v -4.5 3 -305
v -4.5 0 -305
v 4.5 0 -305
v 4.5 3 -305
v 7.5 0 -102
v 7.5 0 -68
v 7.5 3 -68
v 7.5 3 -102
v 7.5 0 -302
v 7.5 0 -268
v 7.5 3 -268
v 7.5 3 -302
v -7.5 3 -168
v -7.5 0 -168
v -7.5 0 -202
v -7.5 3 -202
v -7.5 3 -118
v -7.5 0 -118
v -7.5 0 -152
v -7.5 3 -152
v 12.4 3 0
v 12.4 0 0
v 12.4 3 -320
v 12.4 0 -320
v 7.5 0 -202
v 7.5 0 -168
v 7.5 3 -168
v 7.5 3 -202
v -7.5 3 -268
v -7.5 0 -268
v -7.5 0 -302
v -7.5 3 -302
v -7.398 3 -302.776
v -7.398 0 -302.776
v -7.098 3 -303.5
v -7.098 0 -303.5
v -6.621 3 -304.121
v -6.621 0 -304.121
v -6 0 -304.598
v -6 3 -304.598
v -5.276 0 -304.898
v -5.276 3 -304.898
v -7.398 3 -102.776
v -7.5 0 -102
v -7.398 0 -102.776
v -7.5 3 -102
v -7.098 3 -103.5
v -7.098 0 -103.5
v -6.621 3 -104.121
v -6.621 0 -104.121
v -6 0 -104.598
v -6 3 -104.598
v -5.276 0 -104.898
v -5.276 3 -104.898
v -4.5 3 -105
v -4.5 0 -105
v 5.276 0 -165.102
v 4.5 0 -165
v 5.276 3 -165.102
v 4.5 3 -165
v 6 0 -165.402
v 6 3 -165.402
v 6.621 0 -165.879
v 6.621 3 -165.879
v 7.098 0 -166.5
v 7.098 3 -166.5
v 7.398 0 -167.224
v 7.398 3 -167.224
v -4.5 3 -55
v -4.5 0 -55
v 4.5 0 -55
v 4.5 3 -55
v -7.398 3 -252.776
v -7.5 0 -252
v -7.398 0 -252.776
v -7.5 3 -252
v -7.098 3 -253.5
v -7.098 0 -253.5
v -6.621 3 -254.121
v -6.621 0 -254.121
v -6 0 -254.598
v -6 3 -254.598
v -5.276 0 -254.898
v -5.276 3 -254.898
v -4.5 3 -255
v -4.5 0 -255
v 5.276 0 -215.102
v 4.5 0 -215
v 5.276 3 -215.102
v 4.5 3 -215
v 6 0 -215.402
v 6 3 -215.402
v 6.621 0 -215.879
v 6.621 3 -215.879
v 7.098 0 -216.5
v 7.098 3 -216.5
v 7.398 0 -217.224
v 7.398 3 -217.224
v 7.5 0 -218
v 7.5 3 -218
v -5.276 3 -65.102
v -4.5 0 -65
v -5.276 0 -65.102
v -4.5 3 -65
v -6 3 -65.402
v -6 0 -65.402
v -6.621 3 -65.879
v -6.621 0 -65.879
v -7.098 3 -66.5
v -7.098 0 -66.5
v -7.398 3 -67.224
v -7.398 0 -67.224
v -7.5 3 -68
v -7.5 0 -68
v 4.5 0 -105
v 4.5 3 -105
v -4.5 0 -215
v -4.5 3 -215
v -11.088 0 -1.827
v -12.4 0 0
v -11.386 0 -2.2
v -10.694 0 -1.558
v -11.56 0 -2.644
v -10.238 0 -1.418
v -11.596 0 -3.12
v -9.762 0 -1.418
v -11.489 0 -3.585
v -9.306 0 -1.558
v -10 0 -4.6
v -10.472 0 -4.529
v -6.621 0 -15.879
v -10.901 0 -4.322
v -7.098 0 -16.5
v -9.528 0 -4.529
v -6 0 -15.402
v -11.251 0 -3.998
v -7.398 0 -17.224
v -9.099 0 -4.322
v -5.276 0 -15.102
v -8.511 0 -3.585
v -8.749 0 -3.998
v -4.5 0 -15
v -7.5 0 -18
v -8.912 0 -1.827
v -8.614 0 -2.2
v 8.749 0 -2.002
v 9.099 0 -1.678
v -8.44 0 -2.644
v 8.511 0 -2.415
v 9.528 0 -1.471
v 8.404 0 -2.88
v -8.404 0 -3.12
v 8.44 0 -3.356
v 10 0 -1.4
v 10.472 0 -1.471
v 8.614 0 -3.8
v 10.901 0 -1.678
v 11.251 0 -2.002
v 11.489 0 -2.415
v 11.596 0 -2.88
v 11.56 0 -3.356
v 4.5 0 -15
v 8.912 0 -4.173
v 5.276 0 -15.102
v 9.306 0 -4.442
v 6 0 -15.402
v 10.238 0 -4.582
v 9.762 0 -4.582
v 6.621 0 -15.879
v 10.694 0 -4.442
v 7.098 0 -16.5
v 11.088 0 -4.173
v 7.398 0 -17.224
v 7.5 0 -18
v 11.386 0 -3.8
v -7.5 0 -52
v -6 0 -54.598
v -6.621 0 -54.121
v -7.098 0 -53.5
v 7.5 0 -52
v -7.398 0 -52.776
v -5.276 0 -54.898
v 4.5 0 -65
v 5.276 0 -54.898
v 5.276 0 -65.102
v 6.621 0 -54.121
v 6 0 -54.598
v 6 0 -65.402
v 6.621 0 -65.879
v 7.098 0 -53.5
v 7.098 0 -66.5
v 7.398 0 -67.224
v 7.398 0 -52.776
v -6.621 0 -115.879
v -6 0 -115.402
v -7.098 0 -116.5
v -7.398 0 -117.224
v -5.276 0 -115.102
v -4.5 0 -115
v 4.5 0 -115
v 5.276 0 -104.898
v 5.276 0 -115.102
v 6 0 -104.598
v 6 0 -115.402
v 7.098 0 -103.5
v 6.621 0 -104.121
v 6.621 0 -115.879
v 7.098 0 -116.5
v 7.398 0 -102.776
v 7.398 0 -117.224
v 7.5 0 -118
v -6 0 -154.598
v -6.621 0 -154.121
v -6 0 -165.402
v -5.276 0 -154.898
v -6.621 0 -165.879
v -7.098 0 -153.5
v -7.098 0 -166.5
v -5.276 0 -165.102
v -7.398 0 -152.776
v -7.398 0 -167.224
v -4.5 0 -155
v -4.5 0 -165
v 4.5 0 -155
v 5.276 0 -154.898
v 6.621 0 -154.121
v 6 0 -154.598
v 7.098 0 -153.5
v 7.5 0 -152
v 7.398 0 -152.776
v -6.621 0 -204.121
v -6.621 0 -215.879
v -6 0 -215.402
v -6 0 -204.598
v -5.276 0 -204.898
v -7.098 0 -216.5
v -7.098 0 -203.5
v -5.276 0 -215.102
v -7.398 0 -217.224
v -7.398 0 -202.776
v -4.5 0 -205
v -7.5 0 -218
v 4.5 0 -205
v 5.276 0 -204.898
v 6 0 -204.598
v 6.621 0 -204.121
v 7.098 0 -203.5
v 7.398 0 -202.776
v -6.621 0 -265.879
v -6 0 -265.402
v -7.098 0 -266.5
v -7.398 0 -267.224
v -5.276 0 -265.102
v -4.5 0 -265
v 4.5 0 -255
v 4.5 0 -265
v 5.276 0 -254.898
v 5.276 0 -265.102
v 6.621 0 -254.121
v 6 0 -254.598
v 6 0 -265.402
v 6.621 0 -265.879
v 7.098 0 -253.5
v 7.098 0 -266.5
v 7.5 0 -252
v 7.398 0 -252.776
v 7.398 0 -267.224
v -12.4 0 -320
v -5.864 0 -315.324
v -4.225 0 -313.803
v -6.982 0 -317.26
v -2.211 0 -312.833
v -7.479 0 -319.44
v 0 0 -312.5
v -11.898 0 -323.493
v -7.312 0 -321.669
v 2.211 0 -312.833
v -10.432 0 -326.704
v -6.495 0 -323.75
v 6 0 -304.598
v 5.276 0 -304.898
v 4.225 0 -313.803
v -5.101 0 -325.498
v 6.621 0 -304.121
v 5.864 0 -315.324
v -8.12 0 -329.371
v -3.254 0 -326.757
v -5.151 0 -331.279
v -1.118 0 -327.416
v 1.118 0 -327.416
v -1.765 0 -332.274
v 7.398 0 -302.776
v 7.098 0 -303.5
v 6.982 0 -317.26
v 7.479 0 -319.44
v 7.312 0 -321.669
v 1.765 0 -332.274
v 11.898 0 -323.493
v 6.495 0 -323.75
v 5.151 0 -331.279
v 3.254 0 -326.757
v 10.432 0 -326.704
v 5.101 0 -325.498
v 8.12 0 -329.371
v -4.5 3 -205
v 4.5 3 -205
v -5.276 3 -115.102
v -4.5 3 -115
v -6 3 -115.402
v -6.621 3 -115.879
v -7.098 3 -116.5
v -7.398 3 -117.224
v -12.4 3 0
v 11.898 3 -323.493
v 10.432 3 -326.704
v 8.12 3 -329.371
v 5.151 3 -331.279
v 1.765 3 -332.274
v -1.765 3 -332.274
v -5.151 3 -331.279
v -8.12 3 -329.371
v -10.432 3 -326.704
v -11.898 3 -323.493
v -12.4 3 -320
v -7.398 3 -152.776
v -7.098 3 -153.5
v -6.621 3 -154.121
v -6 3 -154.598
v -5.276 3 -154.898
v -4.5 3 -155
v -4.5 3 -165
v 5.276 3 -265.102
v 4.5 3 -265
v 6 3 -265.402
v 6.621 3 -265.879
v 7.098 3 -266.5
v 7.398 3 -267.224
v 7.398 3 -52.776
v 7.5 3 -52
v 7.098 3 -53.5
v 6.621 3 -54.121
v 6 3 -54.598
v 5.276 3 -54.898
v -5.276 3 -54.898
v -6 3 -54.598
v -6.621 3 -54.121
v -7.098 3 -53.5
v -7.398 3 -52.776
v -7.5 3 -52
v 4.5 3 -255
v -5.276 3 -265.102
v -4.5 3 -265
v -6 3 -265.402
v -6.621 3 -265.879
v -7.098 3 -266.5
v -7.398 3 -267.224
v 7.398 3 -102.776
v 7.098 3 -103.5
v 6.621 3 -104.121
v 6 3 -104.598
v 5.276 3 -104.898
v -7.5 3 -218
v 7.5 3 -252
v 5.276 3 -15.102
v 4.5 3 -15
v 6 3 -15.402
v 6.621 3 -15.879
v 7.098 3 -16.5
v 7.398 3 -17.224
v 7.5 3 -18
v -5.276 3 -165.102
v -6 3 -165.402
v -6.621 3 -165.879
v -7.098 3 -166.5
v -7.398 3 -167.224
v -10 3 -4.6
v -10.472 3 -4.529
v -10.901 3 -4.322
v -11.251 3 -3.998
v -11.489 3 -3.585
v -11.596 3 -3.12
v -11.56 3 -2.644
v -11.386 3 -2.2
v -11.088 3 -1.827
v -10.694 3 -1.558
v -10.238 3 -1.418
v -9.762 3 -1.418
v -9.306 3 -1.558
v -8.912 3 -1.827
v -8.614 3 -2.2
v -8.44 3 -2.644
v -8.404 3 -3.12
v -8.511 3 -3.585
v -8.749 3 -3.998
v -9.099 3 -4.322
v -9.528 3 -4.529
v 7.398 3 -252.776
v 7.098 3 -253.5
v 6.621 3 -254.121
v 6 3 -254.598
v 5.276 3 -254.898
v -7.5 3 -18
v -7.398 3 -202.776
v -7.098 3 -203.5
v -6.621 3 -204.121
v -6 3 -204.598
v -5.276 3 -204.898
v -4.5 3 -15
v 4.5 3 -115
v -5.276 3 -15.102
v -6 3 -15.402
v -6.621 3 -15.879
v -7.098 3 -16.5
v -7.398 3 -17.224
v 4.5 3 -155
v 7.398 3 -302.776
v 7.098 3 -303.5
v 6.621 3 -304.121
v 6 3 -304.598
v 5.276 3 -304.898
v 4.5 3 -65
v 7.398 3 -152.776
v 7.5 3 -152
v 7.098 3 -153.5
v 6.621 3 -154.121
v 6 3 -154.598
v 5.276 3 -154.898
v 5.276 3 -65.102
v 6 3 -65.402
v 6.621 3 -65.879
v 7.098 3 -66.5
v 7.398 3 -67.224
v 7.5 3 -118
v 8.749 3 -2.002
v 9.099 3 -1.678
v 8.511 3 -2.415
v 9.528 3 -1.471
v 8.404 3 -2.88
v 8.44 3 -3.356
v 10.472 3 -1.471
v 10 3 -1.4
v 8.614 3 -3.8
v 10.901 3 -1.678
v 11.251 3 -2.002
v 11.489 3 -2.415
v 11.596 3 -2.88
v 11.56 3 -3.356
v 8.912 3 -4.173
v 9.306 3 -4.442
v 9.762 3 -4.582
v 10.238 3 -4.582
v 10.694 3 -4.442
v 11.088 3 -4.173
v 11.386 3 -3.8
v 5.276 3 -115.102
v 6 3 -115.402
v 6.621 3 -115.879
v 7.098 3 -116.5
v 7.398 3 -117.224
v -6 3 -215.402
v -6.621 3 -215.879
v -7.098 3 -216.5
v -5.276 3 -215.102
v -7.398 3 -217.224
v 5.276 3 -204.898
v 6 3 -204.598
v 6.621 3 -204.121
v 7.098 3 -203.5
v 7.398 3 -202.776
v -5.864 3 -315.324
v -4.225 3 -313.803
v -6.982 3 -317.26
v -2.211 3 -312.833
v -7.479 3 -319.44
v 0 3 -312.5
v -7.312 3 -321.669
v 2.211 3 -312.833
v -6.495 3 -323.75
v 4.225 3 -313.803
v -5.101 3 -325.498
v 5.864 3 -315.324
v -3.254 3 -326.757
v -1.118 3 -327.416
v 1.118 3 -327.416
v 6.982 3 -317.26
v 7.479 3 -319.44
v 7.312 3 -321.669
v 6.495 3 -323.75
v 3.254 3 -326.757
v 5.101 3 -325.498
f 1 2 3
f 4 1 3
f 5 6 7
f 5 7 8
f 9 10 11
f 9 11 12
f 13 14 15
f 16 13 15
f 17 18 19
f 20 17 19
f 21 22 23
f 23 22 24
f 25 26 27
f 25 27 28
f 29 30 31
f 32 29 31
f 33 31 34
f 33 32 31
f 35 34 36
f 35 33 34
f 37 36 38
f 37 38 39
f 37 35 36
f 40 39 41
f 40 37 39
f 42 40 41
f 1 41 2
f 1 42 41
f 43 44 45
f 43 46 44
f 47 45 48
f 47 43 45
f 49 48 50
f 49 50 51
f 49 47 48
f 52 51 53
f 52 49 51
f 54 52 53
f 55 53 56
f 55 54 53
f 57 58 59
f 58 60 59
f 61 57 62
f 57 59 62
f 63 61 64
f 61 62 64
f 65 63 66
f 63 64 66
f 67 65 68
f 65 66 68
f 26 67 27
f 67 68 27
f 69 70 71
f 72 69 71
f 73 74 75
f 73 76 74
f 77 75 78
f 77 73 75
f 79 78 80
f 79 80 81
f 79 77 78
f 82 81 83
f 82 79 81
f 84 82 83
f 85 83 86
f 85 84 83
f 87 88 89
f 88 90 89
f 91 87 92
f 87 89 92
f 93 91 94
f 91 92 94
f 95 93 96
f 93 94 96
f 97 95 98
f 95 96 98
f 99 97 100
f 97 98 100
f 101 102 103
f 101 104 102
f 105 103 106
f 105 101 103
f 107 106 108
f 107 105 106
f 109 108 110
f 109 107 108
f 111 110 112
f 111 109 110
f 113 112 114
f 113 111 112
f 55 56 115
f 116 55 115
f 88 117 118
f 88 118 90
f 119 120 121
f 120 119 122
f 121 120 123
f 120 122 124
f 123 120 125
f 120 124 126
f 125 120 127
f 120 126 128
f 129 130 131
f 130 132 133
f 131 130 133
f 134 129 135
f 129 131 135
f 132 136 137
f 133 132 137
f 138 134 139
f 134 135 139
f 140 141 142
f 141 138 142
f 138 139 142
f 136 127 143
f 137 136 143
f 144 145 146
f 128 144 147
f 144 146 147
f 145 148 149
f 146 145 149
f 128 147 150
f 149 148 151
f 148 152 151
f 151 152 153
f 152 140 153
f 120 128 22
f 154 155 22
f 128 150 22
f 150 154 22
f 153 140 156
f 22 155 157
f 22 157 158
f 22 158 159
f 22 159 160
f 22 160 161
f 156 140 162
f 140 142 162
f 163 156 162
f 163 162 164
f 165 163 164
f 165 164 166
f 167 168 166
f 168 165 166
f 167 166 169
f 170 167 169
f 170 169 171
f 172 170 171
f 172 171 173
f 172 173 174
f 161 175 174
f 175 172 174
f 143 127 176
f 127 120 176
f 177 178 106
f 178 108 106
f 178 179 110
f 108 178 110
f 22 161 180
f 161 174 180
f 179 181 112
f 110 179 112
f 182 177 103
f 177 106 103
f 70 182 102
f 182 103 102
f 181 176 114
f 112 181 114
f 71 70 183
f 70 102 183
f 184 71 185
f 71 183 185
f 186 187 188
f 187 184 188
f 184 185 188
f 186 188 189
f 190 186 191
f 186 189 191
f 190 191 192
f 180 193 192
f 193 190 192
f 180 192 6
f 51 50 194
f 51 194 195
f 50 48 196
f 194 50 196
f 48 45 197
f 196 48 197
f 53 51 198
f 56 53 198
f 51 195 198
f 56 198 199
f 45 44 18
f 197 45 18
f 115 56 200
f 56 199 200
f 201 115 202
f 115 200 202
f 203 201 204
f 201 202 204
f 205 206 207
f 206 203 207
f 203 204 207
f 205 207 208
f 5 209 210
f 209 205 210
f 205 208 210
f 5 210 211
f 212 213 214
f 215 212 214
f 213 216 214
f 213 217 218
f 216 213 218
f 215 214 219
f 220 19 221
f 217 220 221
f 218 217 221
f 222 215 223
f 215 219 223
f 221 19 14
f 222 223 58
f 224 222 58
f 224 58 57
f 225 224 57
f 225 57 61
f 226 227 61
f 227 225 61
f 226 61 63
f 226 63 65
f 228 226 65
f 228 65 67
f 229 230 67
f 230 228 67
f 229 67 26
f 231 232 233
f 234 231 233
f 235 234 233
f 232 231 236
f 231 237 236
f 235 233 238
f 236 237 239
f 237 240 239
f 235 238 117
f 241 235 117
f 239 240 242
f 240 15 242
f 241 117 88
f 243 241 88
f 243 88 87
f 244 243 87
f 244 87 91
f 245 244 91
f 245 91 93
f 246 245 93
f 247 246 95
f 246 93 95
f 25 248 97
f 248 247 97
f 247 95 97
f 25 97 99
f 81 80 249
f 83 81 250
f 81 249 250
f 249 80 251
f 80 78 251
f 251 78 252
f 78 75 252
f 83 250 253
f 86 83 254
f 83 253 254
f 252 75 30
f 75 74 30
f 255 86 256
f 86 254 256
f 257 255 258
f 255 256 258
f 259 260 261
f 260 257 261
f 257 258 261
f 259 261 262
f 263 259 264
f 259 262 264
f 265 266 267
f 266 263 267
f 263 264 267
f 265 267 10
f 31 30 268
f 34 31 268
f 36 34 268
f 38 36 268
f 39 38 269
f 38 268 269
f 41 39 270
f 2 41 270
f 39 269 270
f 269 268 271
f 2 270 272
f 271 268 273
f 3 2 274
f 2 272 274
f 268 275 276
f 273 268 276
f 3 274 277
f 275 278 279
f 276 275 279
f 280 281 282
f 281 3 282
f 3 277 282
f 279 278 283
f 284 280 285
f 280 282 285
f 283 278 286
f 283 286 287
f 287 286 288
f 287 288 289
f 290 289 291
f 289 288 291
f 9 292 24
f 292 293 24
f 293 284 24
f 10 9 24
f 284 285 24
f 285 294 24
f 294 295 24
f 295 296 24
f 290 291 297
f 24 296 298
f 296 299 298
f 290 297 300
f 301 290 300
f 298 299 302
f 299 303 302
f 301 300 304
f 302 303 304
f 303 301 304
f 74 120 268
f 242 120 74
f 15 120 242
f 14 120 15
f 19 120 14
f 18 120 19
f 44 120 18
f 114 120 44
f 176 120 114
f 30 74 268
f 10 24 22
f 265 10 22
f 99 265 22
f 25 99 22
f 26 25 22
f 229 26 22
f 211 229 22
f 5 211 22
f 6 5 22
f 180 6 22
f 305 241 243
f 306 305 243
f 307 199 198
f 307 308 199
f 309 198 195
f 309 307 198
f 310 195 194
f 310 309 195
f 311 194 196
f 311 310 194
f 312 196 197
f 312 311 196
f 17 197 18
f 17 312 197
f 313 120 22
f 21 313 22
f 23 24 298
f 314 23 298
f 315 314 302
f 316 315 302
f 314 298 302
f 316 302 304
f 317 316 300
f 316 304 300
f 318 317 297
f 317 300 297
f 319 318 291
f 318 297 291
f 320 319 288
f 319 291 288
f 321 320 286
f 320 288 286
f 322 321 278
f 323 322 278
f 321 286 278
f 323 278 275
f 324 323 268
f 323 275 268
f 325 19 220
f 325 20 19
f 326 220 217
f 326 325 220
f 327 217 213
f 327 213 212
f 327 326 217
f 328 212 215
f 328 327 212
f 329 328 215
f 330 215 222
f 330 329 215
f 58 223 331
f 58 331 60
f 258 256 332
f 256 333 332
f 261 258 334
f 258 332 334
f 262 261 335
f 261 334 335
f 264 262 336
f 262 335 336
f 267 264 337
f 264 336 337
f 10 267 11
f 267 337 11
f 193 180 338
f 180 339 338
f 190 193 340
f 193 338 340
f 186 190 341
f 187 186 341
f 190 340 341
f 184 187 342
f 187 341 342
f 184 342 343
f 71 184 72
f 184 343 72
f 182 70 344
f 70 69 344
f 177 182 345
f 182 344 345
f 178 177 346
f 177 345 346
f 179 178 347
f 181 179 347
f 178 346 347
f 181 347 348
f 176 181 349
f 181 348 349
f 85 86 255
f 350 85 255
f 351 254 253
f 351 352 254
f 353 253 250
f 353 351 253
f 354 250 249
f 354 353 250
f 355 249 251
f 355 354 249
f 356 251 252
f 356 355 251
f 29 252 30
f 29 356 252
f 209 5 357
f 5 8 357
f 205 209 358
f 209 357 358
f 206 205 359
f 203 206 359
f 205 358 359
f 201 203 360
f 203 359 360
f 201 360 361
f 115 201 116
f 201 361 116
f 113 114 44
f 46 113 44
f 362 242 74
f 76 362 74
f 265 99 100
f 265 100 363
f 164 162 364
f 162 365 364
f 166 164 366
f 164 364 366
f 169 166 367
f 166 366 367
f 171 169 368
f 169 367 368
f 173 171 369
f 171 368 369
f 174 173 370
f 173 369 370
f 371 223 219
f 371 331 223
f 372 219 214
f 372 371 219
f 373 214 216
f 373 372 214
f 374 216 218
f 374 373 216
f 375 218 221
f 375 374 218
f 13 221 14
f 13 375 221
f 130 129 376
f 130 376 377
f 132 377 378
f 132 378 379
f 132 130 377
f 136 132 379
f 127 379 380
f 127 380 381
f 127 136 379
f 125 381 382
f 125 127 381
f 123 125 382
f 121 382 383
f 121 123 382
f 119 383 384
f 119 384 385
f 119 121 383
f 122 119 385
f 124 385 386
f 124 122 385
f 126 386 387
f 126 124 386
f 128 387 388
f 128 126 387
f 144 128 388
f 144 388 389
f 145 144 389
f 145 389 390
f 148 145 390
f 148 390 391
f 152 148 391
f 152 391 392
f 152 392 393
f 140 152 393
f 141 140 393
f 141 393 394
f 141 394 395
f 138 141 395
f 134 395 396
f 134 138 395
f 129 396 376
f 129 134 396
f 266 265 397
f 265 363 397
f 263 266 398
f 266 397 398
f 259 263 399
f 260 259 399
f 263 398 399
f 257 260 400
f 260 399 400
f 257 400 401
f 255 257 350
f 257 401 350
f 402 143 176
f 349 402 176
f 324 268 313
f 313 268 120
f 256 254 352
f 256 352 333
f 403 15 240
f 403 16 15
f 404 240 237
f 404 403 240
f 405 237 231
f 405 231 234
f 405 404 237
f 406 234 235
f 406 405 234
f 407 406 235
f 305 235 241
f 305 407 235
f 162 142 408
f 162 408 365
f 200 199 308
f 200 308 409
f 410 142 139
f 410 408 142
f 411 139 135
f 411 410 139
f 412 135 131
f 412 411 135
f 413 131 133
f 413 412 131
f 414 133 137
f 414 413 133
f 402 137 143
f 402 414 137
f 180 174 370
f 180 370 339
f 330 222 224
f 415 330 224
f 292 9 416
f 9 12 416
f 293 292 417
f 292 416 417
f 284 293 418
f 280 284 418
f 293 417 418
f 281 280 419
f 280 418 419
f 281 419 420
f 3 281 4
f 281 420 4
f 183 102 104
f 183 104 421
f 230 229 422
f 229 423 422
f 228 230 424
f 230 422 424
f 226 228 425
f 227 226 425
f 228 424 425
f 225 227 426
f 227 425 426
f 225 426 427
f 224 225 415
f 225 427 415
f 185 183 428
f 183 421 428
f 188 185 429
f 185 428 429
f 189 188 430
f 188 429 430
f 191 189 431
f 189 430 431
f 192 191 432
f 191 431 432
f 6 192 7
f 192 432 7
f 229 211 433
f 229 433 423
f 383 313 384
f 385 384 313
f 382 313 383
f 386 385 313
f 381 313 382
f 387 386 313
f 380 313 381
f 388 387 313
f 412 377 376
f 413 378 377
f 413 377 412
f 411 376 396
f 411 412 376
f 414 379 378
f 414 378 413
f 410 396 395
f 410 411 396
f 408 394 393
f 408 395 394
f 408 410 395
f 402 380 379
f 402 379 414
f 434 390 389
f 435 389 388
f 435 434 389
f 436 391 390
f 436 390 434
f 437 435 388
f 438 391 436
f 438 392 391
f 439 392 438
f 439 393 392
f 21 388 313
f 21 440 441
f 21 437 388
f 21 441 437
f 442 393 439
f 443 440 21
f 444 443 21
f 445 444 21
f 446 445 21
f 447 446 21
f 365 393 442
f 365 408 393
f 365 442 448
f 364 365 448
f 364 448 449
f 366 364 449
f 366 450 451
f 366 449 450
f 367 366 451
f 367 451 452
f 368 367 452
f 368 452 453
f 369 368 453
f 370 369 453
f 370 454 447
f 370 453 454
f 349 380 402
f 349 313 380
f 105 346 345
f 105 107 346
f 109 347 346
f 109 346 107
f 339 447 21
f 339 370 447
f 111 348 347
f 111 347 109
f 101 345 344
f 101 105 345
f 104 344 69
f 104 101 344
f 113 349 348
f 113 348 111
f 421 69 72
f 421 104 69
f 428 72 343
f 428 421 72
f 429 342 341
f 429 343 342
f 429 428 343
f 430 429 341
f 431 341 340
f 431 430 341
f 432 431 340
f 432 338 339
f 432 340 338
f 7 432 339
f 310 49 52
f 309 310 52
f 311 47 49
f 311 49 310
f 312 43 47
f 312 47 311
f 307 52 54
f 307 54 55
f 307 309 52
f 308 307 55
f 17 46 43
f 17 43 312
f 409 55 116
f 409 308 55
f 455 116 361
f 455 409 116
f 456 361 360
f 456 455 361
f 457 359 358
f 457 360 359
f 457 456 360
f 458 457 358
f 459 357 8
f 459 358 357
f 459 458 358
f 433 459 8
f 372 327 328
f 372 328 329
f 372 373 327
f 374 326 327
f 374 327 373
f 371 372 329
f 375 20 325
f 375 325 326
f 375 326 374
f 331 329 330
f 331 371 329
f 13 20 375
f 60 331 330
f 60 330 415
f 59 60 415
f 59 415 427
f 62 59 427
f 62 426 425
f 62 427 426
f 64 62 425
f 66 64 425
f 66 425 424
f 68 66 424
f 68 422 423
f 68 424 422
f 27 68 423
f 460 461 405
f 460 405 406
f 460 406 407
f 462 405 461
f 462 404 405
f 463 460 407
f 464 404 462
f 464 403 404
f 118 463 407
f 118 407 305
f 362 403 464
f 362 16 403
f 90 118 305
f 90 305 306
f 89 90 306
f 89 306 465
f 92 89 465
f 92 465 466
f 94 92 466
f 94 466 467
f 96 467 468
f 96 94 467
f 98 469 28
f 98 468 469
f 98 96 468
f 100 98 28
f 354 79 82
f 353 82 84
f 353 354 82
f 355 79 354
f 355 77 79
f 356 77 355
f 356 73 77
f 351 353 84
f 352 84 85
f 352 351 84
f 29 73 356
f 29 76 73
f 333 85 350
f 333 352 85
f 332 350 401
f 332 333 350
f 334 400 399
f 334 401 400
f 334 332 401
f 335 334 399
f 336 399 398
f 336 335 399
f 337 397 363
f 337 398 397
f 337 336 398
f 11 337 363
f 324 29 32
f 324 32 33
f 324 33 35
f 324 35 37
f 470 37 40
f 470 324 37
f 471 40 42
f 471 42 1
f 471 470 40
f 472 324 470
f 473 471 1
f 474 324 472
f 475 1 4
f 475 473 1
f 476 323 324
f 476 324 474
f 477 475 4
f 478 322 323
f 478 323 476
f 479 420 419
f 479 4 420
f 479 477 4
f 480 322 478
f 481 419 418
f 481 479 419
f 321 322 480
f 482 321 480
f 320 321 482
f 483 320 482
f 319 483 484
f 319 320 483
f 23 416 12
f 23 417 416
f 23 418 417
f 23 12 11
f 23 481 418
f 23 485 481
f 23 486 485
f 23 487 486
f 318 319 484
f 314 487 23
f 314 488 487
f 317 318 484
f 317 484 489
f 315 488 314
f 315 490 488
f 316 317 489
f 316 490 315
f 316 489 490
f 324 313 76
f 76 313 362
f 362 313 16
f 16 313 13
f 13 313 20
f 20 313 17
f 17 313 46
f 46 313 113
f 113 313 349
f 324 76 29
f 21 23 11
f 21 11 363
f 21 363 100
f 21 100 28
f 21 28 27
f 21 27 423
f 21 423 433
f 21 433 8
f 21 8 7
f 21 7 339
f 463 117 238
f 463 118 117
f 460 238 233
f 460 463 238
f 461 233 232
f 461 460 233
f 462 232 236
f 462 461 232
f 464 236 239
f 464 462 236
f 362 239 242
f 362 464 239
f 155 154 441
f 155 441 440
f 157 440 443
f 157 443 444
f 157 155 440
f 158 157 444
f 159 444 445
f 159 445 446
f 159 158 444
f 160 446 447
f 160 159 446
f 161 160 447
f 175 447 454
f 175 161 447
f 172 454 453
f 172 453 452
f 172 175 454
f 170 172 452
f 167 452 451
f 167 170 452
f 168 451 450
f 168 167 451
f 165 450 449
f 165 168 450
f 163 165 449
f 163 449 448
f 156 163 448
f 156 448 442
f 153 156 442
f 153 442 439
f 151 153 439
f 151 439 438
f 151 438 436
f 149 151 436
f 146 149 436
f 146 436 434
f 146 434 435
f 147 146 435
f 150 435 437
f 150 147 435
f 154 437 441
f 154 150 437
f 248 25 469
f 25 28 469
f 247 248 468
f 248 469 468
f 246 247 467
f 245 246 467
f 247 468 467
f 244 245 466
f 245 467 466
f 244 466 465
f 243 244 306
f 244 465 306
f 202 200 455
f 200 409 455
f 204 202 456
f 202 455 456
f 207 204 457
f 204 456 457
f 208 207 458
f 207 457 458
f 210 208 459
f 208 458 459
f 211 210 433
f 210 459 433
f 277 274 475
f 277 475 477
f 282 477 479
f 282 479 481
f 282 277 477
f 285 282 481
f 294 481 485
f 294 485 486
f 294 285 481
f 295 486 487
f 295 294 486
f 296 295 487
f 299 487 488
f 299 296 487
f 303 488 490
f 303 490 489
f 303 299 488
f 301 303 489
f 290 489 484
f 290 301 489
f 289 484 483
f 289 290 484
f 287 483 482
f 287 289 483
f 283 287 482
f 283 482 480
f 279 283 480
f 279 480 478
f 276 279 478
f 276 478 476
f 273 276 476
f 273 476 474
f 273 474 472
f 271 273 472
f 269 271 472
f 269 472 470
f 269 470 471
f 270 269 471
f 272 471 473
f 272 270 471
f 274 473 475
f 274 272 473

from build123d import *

# Parameters (mm, degrees)
SKETCH_1_R      = 7.5
SKETCH_1_R_2    = 1.6
SKETCH_1_W      = 15
SKETCH_1_H      = 40
EXTRUDE_1_DEPTH = 3
FILLET_1_R      = 3


with BuildPart() as part:
    # 草图1 → 凸台-拉伸1 (new body)
    with BuildSketch(Plane(origin=(0, 0, 0), x_dir=(1, 0, 0), z_dir=(0, 1, 0))):
        with BuildLine():
            Line((-12.4, 320), (-12.4, 0))
            Line((-12.4, 0), (12.4, 0))
            Line((12.4, 0), (12.4, 320))
            ThreePointArc((12.4, 320), (0, 332.4), (-12.4, 320))
        make_face()
        with Locations(Location((0, 320, 0), (0, 0, 270))):
            Circle(SKETCH_1_R, mode=Mode.SUBTRACT)
        with Locations(Location((10, 3, 0), (0, 0, 270))):
            Circle(SKETCH_1_R_2, mode=Mode.SUBTRACT)
        with Locations(Location((-10, 3, 0), (0, 0, 90))):
            Circle(SKETCH_1_R_2, mode=Mode.SUBTRACT)
        with Locations((0, 235)):
            Rectangle(SKETCH_1_W, SKETCH_1_H, mode=Mode.SUBTRACT)
        with Locations((0, 285)):
            Rectangle(SKETCH_1_W, SKETCH_1_H, mode=Mode.SUBTRACT)
        with Locations((0, 185)):
            Rectangle(SKETCH_1_W, SKETCH_1_H, mode=Mode.SUBTRACT)
        with Locations((0, 135)):
            Rectangle(SKETCH_1_W, SKETCH_1_H, mode=Mode.SUBTRACT)
        with Locations((0, 85)):
            Rectangle(SKETCH_1_W, SKETCH_1_H, mode=Mode.SUBTRACT)
        with Locations((0, 35)):
            Rectangle(SKETCH_1_W, SKETCH_1_H, mode=Mode.SUBTRACT)
    extrude(amount=EXTRUDE_1_DEPTH)

    # 圆角1
    fillet_1_edges = [part.edges().sort_by_distance(p)[0] for p in [
        (7.5, 1.5, -265),
        (7.5, 1.5, -305),
        (-7.5, 1.5, -305),
        (-7.5, 1.5, -265),
        (-7.5, 1.5, -215),
        (7.5, 1.5, -215),
        (7.5, 1.5, -255),
        (-7.5, 1.5, -255),
        (-7.5, 1.5, -165),
        (7.5, 1.5, -165),
        (7.5, 1.5, -205),
        (-7.5, 1.5, -205),
        (-7.5, 1.5, -115),
        (7.5, 1.5, -115),
        (7.5, 1.5, -155),
        (-7.5, 1.5, -155),
        (-7.5, 1.5, -65),
        (7.5, 1.5, -65),
        (7.5, 1.5, -105),
        (-7.5, 1.5, -105),
        (-7.5, 1.5, -15),
        (7.5, 1.5, -15),
        (7.5, 1.5, -55),
        (-7.5, 1.5, -55),
    ]]
    fillet(fillet_1_edges, radius=FILLET_1_R)


solid = part.part
